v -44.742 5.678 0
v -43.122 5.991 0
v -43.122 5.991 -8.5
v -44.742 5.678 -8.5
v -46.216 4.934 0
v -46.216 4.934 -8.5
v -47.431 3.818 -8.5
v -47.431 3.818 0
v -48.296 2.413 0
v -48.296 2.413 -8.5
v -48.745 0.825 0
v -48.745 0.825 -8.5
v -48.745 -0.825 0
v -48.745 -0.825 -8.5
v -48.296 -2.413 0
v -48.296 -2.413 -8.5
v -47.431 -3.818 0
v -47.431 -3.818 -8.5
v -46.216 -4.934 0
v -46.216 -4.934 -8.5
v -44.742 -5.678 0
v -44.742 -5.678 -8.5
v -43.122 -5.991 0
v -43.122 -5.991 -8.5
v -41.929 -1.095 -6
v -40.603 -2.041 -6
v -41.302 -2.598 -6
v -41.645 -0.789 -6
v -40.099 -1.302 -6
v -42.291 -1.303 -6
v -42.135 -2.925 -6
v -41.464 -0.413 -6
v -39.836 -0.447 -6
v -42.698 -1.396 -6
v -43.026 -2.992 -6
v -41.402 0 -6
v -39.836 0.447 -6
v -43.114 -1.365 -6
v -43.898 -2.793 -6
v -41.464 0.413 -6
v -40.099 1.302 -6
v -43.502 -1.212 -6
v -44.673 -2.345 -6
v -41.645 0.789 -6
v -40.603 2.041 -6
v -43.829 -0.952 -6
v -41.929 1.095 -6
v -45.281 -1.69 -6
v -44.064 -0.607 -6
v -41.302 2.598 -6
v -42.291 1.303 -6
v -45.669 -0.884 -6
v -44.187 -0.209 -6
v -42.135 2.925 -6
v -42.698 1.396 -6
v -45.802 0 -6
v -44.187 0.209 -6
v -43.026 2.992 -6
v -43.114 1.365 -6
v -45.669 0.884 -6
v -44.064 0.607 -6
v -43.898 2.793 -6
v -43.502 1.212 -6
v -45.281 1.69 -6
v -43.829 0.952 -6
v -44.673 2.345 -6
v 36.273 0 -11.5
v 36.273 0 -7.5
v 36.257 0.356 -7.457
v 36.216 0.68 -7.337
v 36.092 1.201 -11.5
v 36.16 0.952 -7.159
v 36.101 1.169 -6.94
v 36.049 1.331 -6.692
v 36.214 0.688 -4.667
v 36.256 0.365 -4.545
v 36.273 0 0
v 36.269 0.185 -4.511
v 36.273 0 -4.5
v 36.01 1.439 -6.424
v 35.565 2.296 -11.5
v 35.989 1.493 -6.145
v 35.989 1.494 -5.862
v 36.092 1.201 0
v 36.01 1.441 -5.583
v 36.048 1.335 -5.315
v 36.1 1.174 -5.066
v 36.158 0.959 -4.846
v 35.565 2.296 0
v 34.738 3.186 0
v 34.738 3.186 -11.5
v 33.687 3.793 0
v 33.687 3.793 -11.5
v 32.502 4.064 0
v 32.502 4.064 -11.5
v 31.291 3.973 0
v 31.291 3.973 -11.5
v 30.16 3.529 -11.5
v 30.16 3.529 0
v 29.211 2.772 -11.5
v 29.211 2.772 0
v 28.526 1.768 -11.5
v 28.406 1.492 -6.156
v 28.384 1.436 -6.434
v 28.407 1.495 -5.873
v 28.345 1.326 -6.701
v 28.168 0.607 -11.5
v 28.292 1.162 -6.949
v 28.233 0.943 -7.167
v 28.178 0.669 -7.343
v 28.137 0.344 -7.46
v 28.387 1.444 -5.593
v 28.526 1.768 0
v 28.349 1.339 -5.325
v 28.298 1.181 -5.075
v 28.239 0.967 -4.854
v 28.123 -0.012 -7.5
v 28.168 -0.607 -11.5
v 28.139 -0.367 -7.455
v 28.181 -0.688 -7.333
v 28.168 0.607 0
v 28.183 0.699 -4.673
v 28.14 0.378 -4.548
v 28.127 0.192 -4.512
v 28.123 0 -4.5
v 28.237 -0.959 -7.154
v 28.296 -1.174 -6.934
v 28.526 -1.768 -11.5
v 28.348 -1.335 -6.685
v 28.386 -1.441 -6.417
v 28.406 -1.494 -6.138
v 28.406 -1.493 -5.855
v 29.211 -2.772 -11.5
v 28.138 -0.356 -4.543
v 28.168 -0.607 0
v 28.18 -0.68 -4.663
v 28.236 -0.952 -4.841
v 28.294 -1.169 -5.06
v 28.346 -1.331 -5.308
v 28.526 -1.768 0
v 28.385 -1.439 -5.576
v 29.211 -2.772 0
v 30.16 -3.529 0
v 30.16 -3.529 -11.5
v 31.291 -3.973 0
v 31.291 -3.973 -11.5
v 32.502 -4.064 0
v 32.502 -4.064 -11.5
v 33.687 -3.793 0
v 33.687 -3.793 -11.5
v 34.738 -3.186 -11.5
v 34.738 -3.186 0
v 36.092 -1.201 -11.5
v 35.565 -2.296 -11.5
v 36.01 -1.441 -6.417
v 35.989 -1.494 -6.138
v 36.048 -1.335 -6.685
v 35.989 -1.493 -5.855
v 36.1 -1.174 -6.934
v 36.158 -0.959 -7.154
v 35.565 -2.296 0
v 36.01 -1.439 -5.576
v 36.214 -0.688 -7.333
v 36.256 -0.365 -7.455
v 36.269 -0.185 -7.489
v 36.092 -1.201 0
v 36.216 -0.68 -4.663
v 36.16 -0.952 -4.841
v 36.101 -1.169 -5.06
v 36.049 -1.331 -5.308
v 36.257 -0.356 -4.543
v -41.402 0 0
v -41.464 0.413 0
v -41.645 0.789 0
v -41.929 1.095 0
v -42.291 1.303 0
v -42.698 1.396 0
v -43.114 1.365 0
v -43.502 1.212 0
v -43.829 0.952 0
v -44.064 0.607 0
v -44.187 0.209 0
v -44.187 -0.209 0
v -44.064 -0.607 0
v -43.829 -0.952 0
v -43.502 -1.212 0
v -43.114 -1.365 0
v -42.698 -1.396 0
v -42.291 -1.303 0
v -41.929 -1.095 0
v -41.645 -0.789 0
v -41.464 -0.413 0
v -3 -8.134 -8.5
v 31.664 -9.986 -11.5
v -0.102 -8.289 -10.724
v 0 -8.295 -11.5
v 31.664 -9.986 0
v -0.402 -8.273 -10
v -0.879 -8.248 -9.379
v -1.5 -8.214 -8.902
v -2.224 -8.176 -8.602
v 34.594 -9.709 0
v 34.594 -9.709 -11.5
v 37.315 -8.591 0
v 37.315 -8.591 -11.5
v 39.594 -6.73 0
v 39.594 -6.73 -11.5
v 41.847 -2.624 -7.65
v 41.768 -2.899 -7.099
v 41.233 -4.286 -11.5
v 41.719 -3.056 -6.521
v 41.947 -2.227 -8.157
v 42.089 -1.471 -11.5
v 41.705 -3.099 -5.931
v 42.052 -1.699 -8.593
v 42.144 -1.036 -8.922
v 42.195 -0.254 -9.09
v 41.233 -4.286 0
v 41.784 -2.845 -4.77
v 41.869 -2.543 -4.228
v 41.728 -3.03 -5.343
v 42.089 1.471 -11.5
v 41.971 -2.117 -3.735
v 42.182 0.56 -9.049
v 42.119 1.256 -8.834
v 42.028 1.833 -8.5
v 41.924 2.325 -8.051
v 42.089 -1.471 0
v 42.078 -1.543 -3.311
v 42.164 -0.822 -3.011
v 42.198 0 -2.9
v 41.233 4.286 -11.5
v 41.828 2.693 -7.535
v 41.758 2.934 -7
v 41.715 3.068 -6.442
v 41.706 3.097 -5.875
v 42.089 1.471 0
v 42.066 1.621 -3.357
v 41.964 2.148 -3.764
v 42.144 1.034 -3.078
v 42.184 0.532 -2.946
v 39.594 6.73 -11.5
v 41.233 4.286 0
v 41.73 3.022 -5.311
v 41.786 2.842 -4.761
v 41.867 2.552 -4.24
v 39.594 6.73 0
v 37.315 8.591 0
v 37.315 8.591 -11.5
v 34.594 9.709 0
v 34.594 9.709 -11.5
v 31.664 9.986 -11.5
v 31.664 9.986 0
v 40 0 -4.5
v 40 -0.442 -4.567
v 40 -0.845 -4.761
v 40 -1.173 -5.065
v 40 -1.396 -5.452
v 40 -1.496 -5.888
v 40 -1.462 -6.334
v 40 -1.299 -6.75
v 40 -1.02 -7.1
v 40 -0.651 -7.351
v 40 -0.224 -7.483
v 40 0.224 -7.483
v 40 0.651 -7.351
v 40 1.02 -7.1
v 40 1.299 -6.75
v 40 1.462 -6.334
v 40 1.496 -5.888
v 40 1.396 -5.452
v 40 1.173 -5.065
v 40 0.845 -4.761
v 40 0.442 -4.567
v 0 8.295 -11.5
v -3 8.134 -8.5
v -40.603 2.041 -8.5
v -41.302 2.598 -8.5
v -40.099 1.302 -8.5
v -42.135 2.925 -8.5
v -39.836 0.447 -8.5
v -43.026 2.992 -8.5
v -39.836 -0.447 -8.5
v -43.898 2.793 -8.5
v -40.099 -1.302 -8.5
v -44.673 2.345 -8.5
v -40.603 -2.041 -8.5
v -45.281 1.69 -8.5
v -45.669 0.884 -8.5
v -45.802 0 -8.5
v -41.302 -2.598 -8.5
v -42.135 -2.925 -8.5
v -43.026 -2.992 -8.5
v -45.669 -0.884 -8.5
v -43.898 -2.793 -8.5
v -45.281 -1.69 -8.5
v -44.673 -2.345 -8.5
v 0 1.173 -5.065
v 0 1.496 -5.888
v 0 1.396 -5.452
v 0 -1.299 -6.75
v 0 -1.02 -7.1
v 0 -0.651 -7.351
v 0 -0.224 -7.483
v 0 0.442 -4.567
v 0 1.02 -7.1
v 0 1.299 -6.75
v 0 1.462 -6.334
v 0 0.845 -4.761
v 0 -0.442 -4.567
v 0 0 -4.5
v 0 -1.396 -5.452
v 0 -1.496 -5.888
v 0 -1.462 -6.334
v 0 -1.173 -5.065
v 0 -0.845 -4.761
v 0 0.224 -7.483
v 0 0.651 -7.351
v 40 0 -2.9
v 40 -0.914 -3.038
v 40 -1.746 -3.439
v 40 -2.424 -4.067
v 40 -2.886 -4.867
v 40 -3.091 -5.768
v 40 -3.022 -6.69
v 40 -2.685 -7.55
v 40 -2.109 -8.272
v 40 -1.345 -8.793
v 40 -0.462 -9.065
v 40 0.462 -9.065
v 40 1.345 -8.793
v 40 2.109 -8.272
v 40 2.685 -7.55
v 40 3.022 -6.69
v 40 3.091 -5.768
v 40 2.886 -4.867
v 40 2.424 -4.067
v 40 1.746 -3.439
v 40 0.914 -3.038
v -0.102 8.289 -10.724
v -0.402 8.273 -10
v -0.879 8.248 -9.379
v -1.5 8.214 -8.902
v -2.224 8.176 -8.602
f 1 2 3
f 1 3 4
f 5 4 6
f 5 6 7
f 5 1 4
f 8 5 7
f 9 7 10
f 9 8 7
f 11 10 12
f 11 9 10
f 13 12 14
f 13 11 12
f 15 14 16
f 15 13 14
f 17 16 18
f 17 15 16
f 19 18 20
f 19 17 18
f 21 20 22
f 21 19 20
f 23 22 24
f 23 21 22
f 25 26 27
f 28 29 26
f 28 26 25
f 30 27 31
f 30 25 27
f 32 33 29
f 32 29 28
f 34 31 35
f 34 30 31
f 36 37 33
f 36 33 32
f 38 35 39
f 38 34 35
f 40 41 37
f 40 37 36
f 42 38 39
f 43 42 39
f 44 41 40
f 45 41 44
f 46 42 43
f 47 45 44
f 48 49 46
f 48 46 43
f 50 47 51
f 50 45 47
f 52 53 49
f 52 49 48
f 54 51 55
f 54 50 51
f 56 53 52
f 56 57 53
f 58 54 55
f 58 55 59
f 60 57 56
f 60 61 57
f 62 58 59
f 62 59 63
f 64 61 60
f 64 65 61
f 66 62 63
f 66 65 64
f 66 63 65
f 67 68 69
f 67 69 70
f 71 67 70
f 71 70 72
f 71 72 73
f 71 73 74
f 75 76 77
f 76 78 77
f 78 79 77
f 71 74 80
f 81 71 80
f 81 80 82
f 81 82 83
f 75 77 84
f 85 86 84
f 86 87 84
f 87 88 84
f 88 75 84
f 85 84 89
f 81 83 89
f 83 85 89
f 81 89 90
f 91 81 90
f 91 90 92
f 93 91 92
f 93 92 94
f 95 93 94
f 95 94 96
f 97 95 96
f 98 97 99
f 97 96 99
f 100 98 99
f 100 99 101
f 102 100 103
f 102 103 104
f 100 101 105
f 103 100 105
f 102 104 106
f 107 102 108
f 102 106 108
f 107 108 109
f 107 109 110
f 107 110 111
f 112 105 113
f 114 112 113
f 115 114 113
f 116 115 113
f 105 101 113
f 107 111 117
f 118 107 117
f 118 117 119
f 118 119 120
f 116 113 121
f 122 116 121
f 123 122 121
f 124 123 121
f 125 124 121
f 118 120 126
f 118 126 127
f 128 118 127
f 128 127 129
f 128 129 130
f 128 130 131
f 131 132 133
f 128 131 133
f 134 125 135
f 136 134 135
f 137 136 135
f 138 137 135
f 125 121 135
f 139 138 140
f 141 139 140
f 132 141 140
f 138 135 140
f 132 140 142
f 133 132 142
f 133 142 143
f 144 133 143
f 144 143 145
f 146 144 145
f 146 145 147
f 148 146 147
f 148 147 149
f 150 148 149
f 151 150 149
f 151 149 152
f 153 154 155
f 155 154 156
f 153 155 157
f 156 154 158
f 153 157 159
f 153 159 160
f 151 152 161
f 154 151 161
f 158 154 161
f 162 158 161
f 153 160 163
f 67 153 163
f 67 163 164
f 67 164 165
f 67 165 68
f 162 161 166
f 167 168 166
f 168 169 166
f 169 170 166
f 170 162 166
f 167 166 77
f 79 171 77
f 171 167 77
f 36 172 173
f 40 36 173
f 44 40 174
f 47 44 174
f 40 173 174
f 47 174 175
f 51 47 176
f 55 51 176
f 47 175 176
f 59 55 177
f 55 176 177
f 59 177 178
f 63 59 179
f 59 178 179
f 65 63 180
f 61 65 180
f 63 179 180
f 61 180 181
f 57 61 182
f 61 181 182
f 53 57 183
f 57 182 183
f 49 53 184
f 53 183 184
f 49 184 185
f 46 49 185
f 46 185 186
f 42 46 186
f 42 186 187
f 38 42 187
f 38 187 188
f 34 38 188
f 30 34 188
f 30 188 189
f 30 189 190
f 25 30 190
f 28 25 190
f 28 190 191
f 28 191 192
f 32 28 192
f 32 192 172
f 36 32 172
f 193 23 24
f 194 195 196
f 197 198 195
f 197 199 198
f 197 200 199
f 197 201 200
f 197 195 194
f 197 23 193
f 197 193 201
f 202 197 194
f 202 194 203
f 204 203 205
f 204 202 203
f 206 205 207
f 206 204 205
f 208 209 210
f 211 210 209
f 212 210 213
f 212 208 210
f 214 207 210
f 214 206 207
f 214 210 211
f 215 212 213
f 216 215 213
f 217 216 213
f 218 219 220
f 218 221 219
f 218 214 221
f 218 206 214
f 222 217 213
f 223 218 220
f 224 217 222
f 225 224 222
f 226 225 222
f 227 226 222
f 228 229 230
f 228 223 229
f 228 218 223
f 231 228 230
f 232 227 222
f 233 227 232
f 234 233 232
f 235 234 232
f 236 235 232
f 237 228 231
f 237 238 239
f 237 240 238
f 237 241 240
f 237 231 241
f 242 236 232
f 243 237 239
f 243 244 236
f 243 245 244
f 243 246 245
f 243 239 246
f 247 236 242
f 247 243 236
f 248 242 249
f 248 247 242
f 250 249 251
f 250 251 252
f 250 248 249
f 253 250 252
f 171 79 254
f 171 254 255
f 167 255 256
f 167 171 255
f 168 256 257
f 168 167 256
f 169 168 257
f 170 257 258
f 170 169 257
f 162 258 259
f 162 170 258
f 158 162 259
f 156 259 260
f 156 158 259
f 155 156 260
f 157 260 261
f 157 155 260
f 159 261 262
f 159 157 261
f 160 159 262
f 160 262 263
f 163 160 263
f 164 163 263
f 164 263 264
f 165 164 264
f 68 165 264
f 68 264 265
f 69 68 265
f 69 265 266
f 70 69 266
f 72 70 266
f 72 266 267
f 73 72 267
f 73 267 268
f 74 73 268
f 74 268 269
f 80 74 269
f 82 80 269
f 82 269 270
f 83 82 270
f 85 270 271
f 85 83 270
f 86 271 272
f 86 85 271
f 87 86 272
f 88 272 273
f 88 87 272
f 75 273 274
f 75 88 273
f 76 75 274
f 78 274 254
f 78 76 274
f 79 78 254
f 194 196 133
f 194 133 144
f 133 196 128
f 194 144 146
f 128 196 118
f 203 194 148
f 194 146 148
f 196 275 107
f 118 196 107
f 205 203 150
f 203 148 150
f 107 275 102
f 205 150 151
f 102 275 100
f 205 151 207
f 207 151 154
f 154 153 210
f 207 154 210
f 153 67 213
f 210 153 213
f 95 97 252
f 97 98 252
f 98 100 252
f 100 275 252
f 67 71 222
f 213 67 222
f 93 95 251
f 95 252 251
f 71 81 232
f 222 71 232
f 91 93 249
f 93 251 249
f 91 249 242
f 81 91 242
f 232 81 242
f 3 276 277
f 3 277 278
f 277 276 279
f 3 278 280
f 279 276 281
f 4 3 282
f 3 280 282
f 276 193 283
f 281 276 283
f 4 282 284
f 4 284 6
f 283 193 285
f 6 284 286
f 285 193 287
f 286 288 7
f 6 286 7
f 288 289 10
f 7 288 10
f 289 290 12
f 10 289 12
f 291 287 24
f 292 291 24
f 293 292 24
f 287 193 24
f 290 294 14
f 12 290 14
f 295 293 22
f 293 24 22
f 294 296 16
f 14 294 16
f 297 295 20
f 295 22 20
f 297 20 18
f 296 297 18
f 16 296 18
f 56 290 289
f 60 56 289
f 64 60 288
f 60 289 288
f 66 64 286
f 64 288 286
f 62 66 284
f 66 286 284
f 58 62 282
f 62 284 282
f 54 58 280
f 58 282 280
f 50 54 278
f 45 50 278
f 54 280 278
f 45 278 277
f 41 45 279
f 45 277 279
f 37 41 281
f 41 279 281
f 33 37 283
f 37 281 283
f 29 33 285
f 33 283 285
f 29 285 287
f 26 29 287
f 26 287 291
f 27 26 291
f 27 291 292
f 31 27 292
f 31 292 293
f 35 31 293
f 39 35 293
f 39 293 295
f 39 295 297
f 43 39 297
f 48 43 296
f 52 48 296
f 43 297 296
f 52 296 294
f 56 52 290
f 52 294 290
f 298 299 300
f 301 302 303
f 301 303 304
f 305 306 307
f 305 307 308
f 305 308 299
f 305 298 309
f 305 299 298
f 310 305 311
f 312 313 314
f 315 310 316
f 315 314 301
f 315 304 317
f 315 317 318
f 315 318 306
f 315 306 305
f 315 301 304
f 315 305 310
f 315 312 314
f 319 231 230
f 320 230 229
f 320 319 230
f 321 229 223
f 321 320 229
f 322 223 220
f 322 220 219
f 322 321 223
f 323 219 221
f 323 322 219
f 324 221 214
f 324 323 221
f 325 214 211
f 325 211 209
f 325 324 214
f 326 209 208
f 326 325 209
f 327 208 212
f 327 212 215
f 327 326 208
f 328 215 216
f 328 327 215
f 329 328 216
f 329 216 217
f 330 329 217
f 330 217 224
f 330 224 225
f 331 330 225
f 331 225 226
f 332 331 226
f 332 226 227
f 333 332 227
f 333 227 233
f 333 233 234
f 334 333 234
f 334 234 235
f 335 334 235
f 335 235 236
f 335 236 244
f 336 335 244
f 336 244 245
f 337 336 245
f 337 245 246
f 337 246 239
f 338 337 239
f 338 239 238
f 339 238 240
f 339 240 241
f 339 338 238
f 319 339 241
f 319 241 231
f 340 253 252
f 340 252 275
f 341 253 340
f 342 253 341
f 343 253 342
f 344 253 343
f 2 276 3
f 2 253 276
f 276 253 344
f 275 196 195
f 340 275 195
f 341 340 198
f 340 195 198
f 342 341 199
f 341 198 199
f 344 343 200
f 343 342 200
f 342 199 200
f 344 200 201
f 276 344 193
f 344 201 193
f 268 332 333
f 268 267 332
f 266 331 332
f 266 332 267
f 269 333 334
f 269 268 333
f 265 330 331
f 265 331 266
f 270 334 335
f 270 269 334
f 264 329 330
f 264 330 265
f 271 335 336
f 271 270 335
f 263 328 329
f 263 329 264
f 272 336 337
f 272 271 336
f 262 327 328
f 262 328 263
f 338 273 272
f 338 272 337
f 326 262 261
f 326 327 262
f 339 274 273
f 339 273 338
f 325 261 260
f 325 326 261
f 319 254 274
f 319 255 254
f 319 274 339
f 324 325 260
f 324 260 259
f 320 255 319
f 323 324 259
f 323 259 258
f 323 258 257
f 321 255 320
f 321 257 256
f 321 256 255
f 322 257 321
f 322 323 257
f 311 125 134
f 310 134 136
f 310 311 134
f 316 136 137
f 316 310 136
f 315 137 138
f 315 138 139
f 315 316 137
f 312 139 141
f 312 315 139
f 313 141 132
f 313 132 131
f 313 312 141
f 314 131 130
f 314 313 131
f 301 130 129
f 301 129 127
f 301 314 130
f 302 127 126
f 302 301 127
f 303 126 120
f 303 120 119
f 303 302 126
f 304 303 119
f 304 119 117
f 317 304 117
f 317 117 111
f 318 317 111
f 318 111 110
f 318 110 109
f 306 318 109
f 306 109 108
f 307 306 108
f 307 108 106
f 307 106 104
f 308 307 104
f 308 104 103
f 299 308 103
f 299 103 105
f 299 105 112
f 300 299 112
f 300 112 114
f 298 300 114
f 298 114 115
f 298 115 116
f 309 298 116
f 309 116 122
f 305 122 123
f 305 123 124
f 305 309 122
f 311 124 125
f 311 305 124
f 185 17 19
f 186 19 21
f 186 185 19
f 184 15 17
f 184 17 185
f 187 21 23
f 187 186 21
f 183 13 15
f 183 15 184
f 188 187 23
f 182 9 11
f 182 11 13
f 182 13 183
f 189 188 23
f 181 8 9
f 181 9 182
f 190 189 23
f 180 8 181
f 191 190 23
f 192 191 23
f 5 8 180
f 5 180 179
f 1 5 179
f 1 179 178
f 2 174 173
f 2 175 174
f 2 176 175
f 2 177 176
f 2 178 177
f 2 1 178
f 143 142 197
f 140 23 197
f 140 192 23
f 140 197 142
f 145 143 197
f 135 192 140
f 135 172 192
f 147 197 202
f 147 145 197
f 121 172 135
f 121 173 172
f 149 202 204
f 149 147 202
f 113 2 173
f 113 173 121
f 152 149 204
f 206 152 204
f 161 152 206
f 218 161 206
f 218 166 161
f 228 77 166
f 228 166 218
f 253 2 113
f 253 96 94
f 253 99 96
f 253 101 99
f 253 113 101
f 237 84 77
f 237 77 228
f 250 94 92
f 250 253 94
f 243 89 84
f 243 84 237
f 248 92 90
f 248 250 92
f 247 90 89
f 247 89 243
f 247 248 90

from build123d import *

# Parameters (mm, degrees)
SKETCH_1_R               = 1.400000008
SKETCH_1_R_2             = 4.074999999
EXTRUDE_1_DEPTH          = 11.500000001
SKETCH_2_R               = 1.499999995
CUT_EXTRUDE_1_DEPTH      = 52.126386943
CUT_EXTRUDE_START        = 40
SKETCH_2_3_R             = 3.099999995
CUT_EXTRUDE_2_DEPTH      = 12.126386986
CUT_EXTRUDE_3_DEPTH      = 52.126386986
CUT_EXTRUDE_3_DEPTH_BACK = 52.126386986
SKETCH_4_R               = 2.999999992
CUT_EXTRUDE_4_DEPTH      = 2.5


with BuildPart() as part:
    # Эскиз1 → Бобышка-Вытянуть1 (new body)
    with BuildSketch(Plane.XY):
        with BuildLine():
            Line((-43.122227837, -5.991460588), (31.66443883, -9.985767648))
            ThreePointArc((31.66443883, -9.985767648), (42.197772163, 2e-09), (31.66443883, 9.985767652))
            Line((31.66443883, 9.985767652), (-43.122227837, 5.991460592))
            ThreePointArc((-43.122227837, 5.991460592), (-48.802227837, 2e-09), (-43.122227837, -5.991460588))
        make_face()
        with Locations((-42.802227837, 2e-09)):
            Circle(SKETCH_1_R, mode=Mode.SUBTRACT)
        with Locations((32.197772163, 2e-09)):
            Circle(SKETCH_1_R_2, mode=Mode.SUBTRACT)
    extrude(amount=-EXTRUDE_1_DEPTH)

    # Эскиз2 → Вырез-Вытянуть1 (cut, through all)
    with BuildSketch(Plane(origin=(0, 0, 0), x_dir=(0, 0, -1), z_dir=(1, 0, 0))):
        with Locations(Location((6, 6e-09, 0), (0, 0, 180))):
            Circle(SKETCH_2_R)
    extrude(amount=CUT_EXTRUDE_1_DEPTH, mode=Mode.SUBTRACT)

    # Эскиз2<3> → Вырез-Вытянуть2 (cut, through all)
    with BuildSketch(Plane(origin=(0, 0, 0), x_dir=(0, 0, -1), z_dir=(1, 0, 0)).offset(CUT_EXTRUDE_START)):
        with Locations(Location((6, 6e-09, 0), (0, 0, 180))):
            Circle(SKETCH_2_3_R)
    extrude(amount=CUT_EXTRUDE_2_DEPTH, mode=Mode.SUBTRACT)

    # Эскиз3 → Вырез-Вытянуть3 (cut, two sides: drawn at the far end of the back side and taken through both)
    with BuildSketch(Plane(origin=(0, 0, 0), x_dir=(1, 0, 0), z_dir=(0, 1, 0)).offset(-CUT_EXTRUDE_3_DEPTH_BACK)):
        with BuildLine():
            Line((-57.148549842, 26.385379488), (0, 26.385379488))
            Line((0, 26.385379488), (0, 11.5))
            ThreePointArc((0, 11.5), (-0.878679656, 9.378679656), (-3, 8.5))
            Line((-3, 8.5), (-57.148549842, 8.5))
            Line((-57.148549842, 8.5), (-57.148549842, 26.385379488))
        make_face()
    extrude(amount=CUT_EXTRUDE_3_DEPTH + CUT_EXTRUDE_3_DEPTH_BACK, mode=Mode.SUBTRACT)

    # Эскиз4 → Вырез-Вытянуть4 (cut)
    with BuildSketch(Plane(origin=(0, 0, -8.5), x_dir=(-1, 0, 0), z_dir=(0, 0, -1))):
        with Locations((42.802227837, 2e-09)):
            Circle(SKETCH_4_R)
    extrude(amount=-CUT_EXTRUDE_4_DEPTH, mode=Mode.SUBTRACT)


solid = part.part
